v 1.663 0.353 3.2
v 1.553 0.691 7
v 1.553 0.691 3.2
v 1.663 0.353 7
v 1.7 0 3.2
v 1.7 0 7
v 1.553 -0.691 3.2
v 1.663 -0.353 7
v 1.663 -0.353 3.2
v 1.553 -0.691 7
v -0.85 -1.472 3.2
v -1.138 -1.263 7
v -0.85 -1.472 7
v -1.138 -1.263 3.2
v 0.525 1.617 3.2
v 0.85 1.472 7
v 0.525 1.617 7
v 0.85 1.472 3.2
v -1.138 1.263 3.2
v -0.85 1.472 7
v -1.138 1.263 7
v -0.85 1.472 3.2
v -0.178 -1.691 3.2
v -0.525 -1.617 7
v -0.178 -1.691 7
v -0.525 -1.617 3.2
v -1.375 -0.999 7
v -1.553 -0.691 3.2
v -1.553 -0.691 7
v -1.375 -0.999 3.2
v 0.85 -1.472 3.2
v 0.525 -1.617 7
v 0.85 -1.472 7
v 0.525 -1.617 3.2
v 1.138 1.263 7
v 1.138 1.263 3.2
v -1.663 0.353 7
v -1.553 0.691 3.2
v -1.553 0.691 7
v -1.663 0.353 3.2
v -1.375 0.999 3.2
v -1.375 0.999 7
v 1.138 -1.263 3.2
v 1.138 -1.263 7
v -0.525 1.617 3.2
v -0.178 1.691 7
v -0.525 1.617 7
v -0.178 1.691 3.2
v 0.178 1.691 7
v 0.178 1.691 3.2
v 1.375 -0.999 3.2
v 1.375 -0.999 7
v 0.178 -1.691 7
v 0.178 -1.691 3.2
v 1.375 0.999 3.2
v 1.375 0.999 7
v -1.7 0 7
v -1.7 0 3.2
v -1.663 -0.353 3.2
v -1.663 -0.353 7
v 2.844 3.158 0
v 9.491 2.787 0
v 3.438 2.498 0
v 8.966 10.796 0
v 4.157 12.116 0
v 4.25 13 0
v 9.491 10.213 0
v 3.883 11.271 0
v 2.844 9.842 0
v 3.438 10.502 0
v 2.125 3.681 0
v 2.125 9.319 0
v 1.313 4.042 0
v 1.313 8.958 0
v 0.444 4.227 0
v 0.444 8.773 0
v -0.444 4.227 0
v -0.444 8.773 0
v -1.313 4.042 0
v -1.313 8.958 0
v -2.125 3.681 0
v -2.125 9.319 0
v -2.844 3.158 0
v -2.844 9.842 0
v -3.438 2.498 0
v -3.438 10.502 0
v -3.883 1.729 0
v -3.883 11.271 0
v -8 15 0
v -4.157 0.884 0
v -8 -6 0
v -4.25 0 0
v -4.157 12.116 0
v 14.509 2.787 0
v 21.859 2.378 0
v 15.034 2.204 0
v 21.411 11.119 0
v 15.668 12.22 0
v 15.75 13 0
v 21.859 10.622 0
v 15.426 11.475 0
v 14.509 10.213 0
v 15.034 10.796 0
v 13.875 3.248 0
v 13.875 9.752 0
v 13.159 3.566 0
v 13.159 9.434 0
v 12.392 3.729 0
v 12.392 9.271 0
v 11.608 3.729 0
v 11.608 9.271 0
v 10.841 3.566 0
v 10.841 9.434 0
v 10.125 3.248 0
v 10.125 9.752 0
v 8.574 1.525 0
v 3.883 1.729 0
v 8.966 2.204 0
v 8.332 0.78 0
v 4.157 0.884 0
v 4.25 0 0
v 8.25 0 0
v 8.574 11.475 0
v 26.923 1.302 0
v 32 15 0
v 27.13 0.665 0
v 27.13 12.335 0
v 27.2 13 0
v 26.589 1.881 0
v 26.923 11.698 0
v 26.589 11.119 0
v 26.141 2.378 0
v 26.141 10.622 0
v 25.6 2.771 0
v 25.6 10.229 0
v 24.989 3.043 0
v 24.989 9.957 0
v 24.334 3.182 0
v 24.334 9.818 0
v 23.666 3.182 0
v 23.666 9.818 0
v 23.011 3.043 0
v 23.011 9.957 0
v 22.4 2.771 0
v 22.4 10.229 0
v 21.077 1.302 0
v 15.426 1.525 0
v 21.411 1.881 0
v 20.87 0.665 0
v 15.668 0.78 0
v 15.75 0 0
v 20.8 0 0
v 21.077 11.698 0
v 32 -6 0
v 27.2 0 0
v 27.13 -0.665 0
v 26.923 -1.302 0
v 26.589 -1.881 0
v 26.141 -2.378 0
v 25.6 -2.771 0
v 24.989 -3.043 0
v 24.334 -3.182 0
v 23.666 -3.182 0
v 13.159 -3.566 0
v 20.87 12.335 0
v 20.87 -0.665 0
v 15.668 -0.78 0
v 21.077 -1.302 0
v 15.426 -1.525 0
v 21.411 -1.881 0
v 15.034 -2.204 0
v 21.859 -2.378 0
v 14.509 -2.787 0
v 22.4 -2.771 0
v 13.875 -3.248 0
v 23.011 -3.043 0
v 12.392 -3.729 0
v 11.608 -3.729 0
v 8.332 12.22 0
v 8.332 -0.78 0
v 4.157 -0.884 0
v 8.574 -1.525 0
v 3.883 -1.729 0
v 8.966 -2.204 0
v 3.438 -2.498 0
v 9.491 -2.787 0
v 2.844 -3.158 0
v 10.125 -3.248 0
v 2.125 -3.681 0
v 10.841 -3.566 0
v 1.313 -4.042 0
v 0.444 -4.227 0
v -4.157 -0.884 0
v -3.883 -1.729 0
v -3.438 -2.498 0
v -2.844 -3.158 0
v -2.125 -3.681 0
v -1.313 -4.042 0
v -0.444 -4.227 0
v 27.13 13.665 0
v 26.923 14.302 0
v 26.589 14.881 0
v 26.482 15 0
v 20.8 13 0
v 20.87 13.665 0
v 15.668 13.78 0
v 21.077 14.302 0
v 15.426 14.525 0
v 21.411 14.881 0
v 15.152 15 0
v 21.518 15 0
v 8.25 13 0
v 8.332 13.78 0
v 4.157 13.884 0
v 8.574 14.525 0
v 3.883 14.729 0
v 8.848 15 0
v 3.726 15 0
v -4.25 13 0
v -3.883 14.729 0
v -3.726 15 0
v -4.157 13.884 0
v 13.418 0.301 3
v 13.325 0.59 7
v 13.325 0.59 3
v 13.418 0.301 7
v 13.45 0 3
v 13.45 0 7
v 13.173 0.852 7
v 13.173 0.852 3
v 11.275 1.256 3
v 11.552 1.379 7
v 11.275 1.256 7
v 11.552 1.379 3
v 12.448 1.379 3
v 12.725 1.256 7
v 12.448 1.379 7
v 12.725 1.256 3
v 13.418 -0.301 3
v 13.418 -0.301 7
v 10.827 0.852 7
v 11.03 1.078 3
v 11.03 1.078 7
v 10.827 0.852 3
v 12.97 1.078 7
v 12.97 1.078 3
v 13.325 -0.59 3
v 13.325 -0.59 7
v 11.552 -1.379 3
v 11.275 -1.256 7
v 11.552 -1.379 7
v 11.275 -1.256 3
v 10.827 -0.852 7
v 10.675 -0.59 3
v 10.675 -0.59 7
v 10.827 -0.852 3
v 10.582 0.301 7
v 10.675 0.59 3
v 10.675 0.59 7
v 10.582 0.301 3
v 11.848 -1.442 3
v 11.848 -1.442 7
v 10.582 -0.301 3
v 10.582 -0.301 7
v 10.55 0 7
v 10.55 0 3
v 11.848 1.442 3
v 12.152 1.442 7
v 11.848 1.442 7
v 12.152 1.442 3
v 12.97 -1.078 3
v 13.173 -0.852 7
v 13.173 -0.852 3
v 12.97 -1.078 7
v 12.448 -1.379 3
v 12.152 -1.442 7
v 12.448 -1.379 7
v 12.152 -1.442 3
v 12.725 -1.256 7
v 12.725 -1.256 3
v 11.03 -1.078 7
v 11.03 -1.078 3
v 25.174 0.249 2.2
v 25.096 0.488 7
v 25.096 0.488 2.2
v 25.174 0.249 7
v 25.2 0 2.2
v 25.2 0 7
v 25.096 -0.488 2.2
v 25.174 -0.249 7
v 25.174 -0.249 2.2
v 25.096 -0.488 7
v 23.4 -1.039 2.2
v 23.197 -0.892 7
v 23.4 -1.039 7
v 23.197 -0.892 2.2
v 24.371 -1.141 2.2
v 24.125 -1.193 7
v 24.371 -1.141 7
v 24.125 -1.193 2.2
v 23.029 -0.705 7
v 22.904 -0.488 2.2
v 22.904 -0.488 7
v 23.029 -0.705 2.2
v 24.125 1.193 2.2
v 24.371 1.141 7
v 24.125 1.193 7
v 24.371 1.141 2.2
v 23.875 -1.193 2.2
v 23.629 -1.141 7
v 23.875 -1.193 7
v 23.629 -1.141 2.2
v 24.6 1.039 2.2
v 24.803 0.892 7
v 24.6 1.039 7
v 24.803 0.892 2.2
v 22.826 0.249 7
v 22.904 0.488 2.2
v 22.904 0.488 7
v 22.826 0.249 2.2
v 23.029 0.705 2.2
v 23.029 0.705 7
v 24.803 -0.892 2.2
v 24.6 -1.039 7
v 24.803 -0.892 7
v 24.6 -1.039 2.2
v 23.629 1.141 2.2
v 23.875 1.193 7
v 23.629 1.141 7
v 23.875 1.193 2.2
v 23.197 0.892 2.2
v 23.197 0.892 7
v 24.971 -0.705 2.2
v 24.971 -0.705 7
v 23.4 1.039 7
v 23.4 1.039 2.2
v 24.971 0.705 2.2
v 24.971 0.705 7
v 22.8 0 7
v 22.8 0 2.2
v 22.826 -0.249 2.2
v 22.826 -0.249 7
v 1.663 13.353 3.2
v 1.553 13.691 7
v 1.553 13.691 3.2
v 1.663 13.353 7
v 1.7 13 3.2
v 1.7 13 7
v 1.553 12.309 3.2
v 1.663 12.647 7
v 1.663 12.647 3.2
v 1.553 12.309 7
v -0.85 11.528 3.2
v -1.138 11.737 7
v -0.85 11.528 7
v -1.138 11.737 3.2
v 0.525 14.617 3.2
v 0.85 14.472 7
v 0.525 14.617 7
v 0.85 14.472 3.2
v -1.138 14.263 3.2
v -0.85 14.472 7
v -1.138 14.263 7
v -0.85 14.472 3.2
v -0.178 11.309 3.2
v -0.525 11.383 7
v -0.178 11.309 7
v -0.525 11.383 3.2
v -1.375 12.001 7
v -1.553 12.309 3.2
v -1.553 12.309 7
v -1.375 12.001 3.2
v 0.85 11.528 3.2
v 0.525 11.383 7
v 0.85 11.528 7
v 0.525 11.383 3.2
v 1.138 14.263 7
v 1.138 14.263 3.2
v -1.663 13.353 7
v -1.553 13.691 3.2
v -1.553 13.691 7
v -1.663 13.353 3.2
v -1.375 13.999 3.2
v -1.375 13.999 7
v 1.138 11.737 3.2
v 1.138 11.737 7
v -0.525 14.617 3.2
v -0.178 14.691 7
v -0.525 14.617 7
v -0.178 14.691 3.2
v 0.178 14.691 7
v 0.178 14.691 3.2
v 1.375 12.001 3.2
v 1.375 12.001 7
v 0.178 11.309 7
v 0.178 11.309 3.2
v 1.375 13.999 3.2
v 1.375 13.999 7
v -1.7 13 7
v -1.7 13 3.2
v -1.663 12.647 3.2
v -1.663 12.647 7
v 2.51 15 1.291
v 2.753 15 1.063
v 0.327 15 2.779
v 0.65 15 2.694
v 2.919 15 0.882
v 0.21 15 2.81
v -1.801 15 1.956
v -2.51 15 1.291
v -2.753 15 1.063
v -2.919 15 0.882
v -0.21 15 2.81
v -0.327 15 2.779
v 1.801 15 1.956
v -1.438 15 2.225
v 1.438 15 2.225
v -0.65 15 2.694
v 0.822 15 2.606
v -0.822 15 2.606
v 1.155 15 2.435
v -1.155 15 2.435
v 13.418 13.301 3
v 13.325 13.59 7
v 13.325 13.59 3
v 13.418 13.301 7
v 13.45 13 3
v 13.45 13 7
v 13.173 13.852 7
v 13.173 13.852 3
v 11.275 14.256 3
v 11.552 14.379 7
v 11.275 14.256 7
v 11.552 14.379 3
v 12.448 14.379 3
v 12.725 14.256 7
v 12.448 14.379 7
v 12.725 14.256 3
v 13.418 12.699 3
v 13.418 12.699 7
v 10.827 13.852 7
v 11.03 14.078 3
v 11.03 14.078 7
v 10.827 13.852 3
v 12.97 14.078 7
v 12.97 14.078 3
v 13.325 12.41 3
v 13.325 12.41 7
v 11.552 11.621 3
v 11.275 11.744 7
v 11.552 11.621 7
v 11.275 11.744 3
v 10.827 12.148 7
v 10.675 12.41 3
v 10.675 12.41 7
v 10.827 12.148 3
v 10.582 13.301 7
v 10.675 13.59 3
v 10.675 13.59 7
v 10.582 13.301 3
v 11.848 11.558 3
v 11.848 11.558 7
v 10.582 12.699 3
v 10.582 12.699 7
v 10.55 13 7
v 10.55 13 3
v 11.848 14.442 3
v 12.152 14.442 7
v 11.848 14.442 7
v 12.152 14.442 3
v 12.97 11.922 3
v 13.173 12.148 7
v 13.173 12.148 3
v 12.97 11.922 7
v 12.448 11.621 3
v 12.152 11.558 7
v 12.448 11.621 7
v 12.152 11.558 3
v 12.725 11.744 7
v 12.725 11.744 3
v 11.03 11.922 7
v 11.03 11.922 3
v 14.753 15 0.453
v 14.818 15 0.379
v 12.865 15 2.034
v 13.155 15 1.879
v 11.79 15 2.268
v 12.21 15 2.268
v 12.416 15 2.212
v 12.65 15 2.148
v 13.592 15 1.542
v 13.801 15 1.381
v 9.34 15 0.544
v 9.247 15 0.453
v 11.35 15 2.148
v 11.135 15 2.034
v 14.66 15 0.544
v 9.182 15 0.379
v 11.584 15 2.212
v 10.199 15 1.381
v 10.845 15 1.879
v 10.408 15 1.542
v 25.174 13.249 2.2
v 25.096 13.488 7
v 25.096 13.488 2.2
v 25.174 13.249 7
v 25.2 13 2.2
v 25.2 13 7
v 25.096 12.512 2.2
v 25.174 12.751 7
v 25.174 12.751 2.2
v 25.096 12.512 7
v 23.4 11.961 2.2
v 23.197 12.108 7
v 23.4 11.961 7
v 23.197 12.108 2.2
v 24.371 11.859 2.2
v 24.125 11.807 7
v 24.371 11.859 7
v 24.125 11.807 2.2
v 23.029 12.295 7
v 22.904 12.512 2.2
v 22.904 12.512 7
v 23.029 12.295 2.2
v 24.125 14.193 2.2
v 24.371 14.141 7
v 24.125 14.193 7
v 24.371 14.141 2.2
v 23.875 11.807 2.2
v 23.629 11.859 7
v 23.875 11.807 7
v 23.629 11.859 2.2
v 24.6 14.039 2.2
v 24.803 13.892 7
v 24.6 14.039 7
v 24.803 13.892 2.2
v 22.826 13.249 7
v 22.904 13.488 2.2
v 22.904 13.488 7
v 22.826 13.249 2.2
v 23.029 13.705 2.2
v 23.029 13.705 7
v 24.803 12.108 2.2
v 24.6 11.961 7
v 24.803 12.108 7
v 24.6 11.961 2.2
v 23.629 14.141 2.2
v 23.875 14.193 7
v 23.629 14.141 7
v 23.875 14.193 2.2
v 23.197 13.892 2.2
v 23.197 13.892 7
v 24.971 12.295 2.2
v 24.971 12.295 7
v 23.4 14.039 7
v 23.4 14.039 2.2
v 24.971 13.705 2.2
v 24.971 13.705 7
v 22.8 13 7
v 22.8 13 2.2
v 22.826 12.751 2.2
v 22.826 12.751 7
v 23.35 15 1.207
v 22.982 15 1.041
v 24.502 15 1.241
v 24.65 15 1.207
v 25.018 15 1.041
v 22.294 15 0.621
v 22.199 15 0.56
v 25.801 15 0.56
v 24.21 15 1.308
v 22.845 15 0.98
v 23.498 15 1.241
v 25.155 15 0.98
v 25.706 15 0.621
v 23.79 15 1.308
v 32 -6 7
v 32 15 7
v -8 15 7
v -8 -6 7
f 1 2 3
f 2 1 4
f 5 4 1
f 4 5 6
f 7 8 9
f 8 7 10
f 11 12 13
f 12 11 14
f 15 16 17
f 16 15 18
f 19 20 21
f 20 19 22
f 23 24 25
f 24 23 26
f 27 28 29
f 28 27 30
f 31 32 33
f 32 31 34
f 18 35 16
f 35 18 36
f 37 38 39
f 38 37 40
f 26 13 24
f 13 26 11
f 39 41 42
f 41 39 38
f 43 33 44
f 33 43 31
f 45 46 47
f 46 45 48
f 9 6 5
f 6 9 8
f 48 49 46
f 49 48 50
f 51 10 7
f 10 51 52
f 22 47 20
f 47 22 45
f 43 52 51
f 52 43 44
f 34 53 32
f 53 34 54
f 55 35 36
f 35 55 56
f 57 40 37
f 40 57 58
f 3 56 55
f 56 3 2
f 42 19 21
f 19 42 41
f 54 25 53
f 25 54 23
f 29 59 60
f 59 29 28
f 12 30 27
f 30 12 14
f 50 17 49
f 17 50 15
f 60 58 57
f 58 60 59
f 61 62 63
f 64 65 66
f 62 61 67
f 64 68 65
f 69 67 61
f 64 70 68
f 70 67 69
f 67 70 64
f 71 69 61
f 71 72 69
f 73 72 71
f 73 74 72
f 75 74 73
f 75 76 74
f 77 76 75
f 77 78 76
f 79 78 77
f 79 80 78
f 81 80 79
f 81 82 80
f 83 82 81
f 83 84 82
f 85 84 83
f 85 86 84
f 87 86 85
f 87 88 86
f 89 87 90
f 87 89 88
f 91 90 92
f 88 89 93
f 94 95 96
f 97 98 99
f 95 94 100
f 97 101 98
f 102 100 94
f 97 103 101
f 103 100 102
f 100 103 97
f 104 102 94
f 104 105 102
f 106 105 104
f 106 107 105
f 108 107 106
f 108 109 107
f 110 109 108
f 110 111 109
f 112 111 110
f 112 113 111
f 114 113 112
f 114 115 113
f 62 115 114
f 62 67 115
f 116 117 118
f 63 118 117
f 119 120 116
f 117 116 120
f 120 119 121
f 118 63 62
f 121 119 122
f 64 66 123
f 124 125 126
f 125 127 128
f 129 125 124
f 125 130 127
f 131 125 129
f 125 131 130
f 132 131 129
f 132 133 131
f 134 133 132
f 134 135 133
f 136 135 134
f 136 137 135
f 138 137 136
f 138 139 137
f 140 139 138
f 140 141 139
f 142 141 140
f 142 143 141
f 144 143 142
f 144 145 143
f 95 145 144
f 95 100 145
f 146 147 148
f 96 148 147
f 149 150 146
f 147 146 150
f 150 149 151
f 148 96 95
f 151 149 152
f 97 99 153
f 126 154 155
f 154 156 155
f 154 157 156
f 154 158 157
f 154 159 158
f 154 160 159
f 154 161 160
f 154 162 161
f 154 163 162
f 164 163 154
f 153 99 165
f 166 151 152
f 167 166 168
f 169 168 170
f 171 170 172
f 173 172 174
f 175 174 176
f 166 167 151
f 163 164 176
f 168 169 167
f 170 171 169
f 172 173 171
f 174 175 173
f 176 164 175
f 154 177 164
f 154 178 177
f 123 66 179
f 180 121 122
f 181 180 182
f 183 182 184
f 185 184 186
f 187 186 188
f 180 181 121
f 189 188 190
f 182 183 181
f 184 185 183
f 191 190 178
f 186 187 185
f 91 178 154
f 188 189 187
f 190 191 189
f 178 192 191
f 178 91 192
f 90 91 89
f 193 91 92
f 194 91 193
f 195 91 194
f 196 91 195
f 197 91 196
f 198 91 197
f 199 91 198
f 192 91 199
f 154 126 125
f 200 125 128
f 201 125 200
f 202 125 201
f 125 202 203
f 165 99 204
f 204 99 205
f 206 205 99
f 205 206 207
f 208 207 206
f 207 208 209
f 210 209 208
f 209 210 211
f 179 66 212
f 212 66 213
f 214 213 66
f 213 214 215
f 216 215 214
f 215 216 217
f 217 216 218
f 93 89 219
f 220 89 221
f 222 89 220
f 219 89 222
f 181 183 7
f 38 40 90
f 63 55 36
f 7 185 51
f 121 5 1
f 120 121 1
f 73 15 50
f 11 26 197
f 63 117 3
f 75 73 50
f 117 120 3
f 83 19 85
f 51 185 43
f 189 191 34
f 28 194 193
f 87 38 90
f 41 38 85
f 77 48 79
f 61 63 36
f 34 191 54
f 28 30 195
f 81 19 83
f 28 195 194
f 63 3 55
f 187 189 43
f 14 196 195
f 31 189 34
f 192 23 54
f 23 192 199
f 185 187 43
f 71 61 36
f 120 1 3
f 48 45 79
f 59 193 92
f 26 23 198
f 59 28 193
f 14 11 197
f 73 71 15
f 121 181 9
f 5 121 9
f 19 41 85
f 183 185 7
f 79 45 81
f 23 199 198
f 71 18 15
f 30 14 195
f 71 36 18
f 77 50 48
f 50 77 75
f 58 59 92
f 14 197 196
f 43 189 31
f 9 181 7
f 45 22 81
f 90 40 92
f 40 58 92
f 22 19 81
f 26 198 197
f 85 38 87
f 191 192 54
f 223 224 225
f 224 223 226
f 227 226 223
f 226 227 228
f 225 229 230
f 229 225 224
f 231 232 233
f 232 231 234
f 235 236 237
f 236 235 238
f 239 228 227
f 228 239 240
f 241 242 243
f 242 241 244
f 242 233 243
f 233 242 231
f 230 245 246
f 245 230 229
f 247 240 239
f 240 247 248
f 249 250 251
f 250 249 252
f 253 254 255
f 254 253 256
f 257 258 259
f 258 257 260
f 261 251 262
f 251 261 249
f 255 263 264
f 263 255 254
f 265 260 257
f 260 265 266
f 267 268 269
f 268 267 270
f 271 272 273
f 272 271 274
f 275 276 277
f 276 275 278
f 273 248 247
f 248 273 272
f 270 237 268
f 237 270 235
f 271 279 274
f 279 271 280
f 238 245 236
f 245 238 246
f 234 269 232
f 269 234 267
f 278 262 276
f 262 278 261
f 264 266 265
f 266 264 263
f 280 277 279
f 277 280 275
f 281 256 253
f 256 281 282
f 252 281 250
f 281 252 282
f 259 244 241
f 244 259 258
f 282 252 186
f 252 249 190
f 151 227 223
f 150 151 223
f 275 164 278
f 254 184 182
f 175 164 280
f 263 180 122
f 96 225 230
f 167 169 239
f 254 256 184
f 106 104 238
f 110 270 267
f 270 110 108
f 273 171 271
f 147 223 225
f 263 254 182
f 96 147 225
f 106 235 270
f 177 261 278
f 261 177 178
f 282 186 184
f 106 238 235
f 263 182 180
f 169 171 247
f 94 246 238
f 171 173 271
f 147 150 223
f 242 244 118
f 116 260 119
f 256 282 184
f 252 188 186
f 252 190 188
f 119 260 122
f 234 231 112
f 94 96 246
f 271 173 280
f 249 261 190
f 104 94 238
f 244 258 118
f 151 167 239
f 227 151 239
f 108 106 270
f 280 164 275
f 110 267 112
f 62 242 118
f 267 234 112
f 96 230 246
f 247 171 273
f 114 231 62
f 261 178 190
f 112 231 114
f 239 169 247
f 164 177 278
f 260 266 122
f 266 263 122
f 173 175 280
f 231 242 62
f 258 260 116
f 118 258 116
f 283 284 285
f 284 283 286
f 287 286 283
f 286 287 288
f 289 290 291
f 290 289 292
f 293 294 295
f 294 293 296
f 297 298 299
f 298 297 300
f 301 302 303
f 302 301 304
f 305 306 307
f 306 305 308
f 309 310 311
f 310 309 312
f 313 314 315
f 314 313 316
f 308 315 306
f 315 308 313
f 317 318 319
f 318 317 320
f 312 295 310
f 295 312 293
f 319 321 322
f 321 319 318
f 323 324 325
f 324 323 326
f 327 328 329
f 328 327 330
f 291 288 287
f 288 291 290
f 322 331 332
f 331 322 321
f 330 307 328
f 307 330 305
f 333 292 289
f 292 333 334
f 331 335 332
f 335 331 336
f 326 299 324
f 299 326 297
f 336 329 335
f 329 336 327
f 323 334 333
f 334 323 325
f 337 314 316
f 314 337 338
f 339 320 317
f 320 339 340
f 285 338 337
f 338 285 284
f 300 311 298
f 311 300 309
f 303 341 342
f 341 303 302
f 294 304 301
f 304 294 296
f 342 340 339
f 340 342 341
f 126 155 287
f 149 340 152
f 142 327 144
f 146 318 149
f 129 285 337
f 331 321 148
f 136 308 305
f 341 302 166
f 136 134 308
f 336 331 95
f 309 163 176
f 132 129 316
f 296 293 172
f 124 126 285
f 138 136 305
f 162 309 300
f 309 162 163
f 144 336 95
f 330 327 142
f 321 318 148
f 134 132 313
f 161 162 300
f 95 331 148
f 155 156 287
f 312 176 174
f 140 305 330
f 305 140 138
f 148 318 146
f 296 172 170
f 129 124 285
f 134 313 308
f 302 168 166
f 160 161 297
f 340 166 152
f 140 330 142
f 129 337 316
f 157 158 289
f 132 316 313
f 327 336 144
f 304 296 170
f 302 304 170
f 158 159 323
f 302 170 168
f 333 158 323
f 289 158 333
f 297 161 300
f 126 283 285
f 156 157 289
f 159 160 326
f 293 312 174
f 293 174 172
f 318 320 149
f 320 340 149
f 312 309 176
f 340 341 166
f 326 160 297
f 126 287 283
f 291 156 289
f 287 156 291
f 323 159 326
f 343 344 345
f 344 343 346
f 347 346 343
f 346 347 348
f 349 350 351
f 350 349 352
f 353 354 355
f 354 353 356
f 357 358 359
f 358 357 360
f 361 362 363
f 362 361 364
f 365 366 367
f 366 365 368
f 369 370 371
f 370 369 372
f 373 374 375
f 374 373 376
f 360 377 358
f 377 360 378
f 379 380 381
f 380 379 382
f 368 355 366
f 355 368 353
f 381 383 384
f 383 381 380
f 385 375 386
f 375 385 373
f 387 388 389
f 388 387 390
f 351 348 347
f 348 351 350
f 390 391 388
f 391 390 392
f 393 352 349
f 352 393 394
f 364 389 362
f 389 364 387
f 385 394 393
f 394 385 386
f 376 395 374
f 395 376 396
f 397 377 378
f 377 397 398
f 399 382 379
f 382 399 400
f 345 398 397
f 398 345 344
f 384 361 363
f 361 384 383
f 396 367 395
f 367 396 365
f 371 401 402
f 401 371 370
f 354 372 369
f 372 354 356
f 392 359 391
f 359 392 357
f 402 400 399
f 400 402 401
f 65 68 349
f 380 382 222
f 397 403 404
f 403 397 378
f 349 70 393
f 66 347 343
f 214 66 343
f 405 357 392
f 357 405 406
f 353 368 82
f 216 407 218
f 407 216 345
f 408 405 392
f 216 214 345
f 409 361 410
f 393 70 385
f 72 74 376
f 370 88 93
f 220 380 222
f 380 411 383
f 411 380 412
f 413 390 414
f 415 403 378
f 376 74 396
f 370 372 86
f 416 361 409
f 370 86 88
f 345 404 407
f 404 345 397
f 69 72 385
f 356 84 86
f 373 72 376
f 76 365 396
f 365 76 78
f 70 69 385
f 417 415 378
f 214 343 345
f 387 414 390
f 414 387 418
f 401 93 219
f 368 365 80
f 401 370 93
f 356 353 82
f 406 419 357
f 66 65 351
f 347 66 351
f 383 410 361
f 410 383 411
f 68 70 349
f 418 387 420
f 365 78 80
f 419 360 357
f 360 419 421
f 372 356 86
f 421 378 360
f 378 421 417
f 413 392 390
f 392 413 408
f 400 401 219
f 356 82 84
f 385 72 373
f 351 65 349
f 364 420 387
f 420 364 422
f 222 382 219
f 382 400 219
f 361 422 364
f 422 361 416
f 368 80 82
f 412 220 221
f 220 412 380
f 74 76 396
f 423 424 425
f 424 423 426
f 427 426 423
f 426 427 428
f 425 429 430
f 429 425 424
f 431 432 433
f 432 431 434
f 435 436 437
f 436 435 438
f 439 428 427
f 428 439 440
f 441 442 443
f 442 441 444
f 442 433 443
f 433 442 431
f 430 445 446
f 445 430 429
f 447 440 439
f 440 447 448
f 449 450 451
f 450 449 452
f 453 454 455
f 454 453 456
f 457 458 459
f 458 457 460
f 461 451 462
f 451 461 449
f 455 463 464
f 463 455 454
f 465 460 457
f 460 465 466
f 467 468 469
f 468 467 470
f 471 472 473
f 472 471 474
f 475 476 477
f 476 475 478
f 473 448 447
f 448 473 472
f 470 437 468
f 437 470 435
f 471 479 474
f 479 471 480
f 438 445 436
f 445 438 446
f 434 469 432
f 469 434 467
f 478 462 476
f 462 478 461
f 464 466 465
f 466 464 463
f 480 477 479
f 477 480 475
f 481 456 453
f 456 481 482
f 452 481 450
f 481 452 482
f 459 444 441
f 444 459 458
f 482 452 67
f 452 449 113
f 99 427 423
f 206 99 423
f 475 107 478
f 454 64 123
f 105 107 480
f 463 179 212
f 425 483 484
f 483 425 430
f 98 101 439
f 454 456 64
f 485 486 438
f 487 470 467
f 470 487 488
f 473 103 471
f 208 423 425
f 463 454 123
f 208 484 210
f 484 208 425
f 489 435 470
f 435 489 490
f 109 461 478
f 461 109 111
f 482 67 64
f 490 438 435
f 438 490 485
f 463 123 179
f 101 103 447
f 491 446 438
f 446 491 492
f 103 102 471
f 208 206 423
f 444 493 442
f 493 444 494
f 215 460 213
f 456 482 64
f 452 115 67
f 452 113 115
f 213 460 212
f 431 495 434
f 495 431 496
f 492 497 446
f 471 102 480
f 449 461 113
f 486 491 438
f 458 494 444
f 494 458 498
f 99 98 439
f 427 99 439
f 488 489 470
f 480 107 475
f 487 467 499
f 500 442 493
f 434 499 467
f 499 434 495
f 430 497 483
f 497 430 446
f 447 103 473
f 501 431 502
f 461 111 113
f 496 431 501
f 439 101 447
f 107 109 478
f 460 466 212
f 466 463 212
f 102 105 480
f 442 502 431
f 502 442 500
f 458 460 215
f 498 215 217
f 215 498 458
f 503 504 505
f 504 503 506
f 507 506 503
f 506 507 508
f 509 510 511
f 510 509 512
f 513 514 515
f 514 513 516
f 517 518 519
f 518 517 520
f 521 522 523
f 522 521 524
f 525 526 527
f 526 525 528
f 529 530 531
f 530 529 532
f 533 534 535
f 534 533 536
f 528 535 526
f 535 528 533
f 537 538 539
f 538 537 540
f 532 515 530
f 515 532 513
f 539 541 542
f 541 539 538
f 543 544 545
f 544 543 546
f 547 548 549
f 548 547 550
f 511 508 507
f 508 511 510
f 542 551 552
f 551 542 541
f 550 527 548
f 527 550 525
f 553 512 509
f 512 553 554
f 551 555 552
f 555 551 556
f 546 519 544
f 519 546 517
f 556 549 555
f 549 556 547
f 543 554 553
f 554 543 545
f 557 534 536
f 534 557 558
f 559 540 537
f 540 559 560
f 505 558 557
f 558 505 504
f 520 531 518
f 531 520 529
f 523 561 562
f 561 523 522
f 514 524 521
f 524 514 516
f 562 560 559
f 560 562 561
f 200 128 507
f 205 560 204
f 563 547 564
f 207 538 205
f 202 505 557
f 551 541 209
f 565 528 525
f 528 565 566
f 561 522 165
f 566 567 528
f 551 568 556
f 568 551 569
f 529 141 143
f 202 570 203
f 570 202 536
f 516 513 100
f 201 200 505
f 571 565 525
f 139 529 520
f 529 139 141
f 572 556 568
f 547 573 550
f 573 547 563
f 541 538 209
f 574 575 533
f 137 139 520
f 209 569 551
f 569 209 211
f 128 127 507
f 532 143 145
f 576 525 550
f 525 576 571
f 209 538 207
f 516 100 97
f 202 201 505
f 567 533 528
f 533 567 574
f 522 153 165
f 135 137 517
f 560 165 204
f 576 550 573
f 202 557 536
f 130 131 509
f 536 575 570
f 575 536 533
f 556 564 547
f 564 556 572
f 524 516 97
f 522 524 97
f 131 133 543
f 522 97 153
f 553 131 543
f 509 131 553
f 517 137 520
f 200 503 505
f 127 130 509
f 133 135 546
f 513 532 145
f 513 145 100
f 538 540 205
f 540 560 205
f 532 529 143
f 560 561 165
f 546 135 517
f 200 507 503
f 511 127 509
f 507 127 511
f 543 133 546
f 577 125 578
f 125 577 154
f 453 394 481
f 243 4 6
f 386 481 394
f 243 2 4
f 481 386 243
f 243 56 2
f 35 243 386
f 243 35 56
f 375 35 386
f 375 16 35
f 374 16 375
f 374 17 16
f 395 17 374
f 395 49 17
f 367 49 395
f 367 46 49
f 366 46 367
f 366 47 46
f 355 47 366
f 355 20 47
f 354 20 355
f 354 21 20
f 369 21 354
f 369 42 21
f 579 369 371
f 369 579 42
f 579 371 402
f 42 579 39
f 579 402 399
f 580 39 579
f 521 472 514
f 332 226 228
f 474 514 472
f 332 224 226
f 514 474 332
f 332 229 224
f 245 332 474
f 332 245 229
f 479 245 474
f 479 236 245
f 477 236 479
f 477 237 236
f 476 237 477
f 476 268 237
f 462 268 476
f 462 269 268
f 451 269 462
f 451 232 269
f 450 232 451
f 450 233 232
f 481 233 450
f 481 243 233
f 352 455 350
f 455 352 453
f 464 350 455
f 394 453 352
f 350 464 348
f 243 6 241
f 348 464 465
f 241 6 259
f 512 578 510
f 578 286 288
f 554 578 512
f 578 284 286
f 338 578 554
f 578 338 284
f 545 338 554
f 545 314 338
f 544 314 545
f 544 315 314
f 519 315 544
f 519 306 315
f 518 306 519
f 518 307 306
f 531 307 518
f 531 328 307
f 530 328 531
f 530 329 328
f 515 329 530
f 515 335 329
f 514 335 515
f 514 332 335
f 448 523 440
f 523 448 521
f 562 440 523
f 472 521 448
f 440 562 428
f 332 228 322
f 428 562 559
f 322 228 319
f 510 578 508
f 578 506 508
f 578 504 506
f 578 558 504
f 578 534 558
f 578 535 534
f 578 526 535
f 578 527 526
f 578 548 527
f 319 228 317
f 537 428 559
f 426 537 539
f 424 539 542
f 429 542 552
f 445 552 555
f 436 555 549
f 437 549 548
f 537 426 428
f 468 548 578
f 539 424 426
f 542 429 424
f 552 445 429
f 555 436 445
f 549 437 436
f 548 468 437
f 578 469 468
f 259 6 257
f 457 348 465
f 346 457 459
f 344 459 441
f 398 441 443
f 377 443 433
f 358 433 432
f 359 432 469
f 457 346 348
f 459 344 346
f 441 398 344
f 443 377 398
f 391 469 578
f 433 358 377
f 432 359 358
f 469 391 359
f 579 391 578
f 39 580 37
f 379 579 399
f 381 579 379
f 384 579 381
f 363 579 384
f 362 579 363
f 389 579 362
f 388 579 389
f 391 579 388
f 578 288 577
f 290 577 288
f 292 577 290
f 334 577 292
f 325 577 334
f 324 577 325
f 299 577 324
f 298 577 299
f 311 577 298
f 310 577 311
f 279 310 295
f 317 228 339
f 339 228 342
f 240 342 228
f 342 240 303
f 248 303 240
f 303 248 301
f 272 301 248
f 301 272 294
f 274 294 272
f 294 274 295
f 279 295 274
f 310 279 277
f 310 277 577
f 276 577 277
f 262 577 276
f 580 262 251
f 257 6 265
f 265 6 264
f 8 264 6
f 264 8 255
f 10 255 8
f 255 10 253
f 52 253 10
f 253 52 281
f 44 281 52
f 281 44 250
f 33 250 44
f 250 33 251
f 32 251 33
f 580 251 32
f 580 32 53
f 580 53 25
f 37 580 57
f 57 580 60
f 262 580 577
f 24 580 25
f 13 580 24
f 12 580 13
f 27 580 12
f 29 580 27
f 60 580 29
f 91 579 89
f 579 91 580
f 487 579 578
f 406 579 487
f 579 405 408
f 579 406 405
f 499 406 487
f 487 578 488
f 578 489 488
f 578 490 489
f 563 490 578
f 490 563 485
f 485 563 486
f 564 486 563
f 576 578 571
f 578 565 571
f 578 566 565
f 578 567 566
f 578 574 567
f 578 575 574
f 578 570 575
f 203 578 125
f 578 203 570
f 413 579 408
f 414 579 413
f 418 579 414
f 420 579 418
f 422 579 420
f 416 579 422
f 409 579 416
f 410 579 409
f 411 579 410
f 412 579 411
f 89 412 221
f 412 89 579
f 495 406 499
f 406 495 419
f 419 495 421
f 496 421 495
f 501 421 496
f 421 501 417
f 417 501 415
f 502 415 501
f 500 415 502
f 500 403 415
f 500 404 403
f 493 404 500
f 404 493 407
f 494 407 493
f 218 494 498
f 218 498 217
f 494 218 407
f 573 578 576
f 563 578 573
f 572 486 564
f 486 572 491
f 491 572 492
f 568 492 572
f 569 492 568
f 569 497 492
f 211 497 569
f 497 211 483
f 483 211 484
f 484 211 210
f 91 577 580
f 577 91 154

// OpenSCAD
$fn = 30;

module otvorVrut(dlzka, priemer, hlavaPriemer, hlavaVyska) {
    union() {
        cylinder(h = dlzka, d = priemer);
        cylinder(h = hlavaVyska, d1 = hlavaPriemer, d2 = priemer);
    }
}

module otvorVrut4mm(dlzka = 20) {
    otvorVrut(dlzka, priemer = 3.4, hlavaPriemer = 8.5, hlavaVyska = 3.2);
}

module otvorVrut3_5mm(dlzka = 20) {
    otvorVrut(dlzka, priemer = 2.9, hlavaPriemer = 7.5, hlavaVyska = 3);
}

module otvorVrut3mm(dlzka = 20) {
    otvorVrut(dlzka, priemer = 2.4, hlavaPriemer = 6.4, hlavaVyska = 2.2);
}

module testBlok() {
    difference() {
        translate([-8,-6,0]) cube([40,21,7]);

        translate([0,13,0]) union() {
            otvorVrut4mm();
            translate([12, 0, 0]) otvorVrut3_5mm();
            translate([24, 0, 0]) otvorVrut3mm();

        }

        union() {
            otvorVrut4mm();
            translate([12, 0, 0]) otvorVrut3_5mm();
            translate([24, 0, 0]) otvorVrut3mm();
        }
    }
}

testBlok();
